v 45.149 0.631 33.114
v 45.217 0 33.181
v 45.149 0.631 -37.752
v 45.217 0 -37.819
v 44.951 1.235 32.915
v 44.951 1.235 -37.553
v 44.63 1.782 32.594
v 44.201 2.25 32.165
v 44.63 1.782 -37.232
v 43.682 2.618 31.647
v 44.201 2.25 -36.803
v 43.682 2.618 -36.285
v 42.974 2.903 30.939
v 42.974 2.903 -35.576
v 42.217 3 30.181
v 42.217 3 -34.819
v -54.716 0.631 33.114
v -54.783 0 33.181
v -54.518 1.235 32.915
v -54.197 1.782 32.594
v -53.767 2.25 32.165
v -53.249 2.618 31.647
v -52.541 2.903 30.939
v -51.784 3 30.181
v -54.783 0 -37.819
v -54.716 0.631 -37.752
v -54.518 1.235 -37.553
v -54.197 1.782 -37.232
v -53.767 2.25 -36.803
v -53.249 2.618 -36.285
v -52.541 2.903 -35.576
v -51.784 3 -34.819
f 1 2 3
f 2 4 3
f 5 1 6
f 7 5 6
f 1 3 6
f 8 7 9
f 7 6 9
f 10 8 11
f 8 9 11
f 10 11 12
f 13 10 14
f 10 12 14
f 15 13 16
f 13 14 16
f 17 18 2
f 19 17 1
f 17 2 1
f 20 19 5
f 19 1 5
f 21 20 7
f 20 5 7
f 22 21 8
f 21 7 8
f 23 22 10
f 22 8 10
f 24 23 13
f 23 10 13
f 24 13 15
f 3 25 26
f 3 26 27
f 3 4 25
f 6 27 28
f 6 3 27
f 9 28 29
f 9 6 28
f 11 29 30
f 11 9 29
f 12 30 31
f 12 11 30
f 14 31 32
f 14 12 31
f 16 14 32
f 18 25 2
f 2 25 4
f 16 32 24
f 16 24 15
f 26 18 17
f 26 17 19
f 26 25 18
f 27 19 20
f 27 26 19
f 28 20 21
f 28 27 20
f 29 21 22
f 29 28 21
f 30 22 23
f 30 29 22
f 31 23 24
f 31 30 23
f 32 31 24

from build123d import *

# Parameters (mm, degrees)
SKETCH1_W           = 100
SKETCH1_H           = 71
BOSS_EXTRUDE1_DEPTH = 3
FILLET4_R           = 3


with BuildPart() as part:
    # Sketch1 → Boss-Extrude1 (new body)
    with BuildSketch(Plane(origin=(0, 0, 0), x_dir=(1, 0, 0), z_dir=(0, 1, 0))):
        with Locations((-4.783432937, 2.318867117)):
            Rectangle(SKETCH1_W, SKETCH1_H)
    extrude(amount=BOSS_EXTRUDE1_DEPTH)

    # Fillet4
    fillet4_edges = [part.edges().sort_by_distance(p)[0] for p in [
        (-4.783432937, 3, -37.818867117),
        (45.216567063, 3, -2.318867117),
        (-4.783432937, 3, 33.181132883),
        (-54.783432937, 3, -2.318867117),
    ]]
    fillet(fillet4_edges, radius=FILLET4_R - 0.0001)  # a hair under: the kernel refuses the full size


solid = part.part
